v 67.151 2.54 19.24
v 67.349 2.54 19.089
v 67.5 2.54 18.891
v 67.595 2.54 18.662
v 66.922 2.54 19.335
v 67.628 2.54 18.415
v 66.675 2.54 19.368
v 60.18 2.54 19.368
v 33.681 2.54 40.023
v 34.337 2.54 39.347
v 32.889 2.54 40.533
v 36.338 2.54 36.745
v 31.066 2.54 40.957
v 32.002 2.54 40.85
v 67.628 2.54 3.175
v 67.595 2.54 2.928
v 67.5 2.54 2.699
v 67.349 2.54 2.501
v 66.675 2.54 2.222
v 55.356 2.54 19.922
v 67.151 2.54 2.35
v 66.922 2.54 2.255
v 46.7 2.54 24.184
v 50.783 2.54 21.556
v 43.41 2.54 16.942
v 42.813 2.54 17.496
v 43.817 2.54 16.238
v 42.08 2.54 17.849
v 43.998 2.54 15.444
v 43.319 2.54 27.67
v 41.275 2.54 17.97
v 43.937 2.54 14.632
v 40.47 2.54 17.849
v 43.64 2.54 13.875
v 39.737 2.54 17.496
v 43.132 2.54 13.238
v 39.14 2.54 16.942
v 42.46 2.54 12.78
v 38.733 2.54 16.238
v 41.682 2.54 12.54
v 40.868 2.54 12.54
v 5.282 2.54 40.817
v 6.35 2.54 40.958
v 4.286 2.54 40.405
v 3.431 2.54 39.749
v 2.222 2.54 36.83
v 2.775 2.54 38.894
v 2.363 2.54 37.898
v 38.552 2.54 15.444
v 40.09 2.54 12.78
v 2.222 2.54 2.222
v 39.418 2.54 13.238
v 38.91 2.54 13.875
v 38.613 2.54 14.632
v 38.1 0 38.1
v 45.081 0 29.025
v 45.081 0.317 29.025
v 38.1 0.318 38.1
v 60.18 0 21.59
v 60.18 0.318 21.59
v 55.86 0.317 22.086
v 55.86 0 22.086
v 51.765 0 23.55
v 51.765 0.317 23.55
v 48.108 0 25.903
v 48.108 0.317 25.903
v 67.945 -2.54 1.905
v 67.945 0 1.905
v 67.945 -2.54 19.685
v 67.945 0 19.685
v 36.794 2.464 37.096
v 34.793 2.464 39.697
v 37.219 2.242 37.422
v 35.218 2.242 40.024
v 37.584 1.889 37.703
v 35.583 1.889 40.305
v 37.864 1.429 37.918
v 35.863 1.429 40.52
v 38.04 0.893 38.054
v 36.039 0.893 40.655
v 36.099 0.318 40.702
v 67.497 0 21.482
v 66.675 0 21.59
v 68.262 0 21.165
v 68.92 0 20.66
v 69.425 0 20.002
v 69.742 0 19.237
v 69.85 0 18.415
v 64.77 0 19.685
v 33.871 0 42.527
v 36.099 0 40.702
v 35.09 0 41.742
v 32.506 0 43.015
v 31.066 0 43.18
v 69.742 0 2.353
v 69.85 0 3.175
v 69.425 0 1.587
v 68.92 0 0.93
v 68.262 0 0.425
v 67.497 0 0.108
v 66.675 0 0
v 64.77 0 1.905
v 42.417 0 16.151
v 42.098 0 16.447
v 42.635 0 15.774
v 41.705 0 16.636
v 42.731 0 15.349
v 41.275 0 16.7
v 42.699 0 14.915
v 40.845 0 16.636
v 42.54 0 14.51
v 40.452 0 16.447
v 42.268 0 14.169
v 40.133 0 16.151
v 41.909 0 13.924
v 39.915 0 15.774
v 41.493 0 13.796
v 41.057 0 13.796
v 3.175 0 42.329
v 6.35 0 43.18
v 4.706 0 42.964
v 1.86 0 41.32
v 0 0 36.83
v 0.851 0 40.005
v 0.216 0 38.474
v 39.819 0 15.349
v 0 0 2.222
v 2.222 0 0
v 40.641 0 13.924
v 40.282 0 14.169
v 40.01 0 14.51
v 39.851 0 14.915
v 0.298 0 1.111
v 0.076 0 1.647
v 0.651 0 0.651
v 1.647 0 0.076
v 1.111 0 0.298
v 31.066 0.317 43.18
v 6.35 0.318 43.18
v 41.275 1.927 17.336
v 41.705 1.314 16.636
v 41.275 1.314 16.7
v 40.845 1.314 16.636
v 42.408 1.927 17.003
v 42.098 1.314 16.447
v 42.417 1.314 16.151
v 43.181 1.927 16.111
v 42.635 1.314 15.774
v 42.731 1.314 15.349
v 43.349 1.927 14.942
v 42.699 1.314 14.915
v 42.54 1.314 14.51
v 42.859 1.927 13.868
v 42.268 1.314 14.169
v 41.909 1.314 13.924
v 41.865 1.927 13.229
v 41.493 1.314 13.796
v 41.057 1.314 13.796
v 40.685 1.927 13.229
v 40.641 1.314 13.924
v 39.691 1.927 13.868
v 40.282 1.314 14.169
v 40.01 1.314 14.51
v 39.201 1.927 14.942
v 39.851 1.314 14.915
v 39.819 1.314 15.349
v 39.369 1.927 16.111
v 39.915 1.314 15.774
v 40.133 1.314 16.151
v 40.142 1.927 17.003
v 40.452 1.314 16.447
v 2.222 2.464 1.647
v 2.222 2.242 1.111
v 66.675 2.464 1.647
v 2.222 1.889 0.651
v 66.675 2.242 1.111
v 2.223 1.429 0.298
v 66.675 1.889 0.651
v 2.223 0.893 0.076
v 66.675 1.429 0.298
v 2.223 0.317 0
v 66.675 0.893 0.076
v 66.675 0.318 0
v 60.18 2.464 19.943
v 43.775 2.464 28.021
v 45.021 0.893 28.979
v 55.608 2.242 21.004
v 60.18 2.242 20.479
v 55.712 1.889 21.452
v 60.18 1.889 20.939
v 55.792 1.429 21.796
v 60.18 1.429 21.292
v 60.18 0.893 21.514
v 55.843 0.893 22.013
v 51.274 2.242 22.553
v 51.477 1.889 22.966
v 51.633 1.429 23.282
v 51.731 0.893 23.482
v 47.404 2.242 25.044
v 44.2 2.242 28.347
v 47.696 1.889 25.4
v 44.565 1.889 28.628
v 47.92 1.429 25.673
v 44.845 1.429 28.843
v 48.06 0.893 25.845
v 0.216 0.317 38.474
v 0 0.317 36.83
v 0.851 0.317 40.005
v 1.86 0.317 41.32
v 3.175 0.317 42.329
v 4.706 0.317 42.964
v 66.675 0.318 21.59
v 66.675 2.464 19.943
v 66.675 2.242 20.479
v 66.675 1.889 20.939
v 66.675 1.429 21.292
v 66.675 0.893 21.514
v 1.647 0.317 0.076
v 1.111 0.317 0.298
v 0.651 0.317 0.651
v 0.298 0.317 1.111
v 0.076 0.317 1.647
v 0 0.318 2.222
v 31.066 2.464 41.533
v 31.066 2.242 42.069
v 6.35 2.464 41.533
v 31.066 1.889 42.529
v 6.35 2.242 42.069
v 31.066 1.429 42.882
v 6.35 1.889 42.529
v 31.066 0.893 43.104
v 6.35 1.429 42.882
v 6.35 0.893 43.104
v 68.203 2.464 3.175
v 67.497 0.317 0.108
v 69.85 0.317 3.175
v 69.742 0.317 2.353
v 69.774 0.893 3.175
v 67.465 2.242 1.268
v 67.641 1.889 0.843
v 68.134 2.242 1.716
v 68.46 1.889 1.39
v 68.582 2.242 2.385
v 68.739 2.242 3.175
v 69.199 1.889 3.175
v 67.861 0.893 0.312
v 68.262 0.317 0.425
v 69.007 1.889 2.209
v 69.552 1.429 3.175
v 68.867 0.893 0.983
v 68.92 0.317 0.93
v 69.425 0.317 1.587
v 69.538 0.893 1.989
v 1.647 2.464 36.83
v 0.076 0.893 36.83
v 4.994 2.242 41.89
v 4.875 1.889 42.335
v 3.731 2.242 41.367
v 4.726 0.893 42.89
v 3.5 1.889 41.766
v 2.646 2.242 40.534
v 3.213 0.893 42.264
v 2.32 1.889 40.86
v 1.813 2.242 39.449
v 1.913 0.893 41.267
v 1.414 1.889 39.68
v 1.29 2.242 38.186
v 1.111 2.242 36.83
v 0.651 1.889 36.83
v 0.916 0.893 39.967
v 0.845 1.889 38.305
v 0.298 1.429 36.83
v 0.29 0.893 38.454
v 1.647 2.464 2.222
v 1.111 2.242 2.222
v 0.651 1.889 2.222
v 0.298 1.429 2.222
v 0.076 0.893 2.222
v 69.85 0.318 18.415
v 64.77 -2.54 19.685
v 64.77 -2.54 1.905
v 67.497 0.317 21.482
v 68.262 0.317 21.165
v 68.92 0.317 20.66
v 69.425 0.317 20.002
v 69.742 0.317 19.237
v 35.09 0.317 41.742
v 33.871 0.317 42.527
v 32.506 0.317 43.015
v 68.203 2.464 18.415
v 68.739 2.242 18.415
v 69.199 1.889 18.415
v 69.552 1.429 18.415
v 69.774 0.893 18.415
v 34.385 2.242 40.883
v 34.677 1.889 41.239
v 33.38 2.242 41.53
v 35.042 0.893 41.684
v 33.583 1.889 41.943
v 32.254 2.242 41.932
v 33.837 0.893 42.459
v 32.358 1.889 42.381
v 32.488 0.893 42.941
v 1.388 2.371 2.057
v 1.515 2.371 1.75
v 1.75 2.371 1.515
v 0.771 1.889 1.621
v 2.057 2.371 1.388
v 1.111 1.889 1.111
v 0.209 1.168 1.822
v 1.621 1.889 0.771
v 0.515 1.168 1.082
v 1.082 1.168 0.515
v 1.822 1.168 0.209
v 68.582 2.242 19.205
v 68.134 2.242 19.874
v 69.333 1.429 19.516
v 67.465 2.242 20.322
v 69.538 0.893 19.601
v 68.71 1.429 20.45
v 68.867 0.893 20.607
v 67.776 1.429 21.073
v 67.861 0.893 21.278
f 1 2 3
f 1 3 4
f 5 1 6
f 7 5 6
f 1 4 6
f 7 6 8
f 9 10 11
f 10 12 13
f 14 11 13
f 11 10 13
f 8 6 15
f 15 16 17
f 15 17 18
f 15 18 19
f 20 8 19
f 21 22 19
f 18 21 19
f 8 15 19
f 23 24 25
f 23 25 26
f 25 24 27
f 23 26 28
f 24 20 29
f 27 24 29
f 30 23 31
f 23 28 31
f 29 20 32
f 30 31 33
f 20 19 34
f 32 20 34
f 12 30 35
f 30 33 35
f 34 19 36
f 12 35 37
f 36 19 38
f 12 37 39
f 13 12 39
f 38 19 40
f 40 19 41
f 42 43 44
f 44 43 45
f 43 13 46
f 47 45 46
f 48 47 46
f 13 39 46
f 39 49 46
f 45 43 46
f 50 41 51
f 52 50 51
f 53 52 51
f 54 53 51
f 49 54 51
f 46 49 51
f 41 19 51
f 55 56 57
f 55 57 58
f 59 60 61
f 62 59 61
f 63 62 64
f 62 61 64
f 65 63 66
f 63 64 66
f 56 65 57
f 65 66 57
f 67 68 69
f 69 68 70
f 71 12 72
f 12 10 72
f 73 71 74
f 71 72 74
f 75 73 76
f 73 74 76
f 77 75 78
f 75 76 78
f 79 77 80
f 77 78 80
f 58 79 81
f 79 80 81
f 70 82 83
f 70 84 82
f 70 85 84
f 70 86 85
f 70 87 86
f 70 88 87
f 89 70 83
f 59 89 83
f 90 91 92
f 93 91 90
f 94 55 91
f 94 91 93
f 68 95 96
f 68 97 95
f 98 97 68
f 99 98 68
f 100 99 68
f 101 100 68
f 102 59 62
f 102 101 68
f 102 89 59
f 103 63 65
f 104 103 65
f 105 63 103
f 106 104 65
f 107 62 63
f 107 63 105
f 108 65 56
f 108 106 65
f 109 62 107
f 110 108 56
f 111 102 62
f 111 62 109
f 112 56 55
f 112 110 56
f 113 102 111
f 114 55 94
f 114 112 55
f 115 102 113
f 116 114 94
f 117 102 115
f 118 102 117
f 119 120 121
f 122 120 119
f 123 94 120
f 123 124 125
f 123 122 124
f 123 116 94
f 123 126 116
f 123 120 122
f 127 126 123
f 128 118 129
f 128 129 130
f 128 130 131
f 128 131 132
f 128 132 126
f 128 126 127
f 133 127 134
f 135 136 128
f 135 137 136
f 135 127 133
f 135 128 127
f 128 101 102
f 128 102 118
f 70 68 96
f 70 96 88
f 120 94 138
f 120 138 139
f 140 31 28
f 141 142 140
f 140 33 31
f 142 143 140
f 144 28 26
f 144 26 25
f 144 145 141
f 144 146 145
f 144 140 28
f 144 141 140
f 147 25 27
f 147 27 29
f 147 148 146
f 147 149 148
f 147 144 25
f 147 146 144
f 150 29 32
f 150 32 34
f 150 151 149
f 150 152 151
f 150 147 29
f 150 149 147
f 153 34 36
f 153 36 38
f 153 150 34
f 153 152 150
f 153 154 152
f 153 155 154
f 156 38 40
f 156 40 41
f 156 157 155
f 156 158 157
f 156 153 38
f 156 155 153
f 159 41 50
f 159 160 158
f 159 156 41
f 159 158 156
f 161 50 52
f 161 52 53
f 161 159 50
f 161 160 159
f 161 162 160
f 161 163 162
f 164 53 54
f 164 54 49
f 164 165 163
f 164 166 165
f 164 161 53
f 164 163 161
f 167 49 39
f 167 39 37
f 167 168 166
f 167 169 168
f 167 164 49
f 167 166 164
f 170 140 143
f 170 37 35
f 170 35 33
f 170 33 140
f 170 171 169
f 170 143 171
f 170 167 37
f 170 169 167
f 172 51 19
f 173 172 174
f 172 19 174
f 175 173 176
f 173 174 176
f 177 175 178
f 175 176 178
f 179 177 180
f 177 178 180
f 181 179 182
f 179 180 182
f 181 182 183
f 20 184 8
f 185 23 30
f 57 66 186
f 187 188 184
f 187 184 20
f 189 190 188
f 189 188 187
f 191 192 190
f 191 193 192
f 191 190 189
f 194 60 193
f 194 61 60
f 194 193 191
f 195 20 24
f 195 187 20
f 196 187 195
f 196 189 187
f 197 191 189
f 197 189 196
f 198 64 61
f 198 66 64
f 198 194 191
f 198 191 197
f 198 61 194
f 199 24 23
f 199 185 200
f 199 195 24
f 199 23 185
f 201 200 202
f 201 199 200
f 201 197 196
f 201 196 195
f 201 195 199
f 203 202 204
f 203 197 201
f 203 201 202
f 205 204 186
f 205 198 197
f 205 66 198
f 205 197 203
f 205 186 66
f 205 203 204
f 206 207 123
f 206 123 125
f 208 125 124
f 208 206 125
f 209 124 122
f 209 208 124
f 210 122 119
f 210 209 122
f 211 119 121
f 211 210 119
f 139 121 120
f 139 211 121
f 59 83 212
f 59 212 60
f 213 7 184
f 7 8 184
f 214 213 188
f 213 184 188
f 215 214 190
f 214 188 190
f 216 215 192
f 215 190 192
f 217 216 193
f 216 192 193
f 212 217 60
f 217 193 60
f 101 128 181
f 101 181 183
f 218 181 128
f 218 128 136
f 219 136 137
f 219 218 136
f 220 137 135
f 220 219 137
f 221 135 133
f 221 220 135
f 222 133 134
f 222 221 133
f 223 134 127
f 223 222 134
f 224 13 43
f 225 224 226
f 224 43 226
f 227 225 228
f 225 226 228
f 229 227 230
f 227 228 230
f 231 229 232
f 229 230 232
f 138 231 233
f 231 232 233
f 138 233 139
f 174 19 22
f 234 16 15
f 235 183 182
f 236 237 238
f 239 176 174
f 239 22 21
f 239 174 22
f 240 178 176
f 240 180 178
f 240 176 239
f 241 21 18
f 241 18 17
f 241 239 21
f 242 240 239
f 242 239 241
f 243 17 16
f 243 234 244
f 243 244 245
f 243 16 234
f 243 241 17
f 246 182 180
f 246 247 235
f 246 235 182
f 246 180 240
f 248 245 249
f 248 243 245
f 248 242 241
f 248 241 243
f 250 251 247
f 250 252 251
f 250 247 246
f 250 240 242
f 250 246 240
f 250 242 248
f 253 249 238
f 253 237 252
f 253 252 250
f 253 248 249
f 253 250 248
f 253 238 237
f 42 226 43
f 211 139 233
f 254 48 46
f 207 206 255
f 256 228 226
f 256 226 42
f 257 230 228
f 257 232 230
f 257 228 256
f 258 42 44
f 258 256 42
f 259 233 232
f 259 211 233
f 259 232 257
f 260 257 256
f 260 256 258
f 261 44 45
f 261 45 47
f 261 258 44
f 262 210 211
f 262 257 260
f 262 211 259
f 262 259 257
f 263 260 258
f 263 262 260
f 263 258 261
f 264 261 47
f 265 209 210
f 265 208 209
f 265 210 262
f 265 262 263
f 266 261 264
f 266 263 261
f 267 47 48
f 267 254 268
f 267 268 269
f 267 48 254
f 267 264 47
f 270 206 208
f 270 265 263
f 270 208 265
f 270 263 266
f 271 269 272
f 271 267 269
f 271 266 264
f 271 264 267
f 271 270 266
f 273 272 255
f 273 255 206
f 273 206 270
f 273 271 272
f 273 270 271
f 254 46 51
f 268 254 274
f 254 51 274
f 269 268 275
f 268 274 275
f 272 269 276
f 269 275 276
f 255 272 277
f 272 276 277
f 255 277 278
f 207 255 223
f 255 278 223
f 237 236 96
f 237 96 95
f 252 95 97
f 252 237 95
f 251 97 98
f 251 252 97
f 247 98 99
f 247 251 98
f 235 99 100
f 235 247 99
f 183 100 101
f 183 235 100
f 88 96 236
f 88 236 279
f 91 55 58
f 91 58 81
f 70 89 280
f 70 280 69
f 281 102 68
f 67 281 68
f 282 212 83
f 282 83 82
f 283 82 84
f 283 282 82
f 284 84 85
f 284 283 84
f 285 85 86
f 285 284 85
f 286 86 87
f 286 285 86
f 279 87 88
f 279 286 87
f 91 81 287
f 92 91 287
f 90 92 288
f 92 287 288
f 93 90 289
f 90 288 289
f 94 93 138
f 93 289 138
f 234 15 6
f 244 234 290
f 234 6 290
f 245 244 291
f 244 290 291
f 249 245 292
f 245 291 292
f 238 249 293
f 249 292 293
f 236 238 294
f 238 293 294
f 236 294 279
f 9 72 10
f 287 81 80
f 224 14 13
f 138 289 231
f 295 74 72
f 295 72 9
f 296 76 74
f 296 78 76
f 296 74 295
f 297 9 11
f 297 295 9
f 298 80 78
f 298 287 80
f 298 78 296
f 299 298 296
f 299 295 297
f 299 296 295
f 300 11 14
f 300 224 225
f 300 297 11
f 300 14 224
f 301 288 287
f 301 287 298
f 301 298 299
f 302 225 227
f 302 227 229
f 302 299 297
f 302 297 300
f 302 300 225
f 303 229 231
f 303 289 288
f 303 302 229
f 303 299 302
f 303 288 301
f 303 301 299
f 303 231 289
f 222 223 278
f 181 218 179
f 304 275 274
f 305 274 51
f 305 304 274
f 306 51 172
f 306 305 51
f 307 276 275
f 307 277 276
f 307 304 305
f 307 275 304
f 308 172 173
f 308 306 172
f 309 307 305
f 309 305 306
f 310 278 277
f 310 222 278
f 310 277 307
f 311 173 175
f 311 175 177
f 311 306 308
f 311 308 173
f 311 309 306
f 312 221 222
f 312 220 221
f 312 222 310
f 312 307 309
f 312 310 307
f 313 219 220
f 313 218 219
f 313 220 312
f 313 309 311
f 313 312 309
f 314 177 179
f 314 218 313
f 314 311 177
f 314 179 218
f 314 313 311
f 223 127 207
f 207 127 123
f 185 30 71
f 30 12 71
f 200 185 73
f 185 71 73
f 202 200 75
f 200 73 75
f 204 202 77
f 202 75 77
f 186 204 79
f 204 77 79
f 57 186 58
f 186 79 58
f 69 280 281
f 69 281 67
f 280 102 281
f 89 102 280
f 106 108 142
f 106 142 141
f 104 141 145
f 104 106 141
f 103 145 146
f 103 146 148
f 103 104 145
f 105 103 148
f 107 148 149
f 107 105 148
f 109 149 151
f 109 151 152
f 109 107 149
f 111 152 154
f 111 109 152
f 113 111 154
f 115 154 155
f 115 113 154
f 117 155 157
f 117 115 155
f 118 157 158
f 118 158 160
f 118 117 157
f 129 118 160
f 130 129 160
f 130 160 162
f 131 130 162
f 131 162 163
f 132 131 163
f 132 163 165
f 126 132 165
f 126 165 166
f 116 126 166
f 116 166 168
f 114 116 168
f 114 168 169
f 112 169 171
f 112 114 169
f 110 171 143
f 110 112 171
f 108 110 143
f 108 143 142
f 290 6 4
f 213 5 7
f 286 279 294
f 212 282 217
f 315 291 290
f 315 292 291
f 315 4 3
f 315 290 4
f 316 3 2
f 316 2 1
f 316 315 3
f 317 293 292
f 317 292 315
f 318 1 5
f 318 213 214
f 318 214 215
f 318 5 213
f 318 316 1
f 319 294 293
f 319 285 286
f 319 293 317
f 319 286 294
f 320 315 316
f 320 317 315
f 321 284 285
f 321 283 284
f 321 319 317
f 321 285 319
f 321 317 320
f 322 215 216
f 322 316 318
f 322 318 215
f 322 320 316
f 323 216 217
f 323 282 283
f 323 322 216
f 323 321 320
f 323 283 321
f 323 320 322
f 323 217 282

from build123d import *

# Parameters (mm, degrees)
SKETCH1_R           = 1.4605
BOSS_EXTRUDE1_DEPTH = 2.54
SKETCH12_W          = 3.175
SKETCH12_H          = 17.78
BOSS_EXTRUDE7_DEPTH = 2.54
FILLET6_R           = 19.05
FILLET7_R           = 6.35
FILLET8_R           = 3.175
FILLET9_R           = 2.2225
CHAMFER1_SIZE       = 1.27
CHAMFER1_SIZE2      = 1.226424744
FILLET10_R          = 2.2225


with BuildPart() as part:
    # Sketch1 → Boss-Extrude1 (new body)
    with BuildSketch(Plane(origin=(0, 0, 0), x_dir=(1, 0, 0), z_dir=(0, 1, 0))):
        Polygon((0, 0), (69.85, 0), (69.85, -21.59), (50.8, -21.59), (38.1, -38.1), (34.192307692, -43.18), (0, -43.18), (0, -38.1), align=None)
        with Locations(Location((41.275, -15.24, 0), (0, 0, 270))):
            Circle(SKETCH1_R, mode=Mode.SUBTRACT)
    extrude(amount=BOSS_EXTRUDE1_DEPTH)

    # Sketch12 → Boss-Extrude7 (add)
    with BuildSketch(Plane.XZ):
        with Locations((66.3575, 10.795)):
            Rectangle(SKETCH12_W, SKETCH12_H)
    extrude(amount=BOSS_EXTRUDE7_DEPTH)

    # Fillet6
    fillet6_edges = [part.edges().sort_by_distance(p)[0] for p in [
        (50.8, 1.27, 21.59),
    ]]
    fillet(fillet6_edges, radius=FILLET6_R)

    # Fillet7
    fillet7_edges = [part.edges().sort_by_distance(p)[0] for p in [
        (34.192307692, 1.27, 43.18),
        (0, 1.27, 43.18),
    ]]
    fillet(fillet7_edges, radius=FILLET7_R)

    # Fillet8
    fillet8_edges = [part.edges().sort_by_distance(p)[0] for p in [
        (69.85, 1.27, 0),
        (69.85, 1.27, 21.59),
    ]]
    fillet(fillet8_edges, radius=FILLET8_R)

    # Fillet9
    fillet9_edges = [part.edges().sort_by_distance(p)[0] for p in [
        (0, 1.27, 0),
    ]]
    fillet(fillet9_edges, radius=FILLET9_R)

    # Chamfer1
    chamfer1_edges = [part.edges().sort_by_distance(p)[0] for p in [
        (41.275, 2.54, 13.7795),
    ]]
    chamfer1_side = [part.faces().sort_by_distance(p)[0] for p in [
        (29.97778843, 2.54, 18.654075923),
    ]]
    chamfer(chamfer1_edges, length=CHAMFER1_SIZE, length2=CHAMFER1_SIZE2, reference=chamfer1_side[0])

    # Fillet10
    fillet10_edges = [part.edges().sort_by_distance(p)[0] for p in [
        (63.427624263, 2.54, 21.59),
        (51.764877453, 2.54, 23.549533953),
        (18.707779092, 2.54, 43.18),
        (40.589741024, 2.54, 34.863336669),
        (33.870681875, 2.54, 42.526822016),
        (1.859871939, 2.54, 41.320128061),
        (34.44875, 2.54, 0),
        (69.85, 2.54, 10.795),
        (68.92006403, 2.54, 20.66006403),
        (68.92006403, 2.54, 0.92993597),
        (0, 2.54, 19.52625),
        (0.650955179, 2.54, 0.650955179),
    ]]
    fillet(fillet10_edges, radius=FILLET10_R)


solid = part.part
